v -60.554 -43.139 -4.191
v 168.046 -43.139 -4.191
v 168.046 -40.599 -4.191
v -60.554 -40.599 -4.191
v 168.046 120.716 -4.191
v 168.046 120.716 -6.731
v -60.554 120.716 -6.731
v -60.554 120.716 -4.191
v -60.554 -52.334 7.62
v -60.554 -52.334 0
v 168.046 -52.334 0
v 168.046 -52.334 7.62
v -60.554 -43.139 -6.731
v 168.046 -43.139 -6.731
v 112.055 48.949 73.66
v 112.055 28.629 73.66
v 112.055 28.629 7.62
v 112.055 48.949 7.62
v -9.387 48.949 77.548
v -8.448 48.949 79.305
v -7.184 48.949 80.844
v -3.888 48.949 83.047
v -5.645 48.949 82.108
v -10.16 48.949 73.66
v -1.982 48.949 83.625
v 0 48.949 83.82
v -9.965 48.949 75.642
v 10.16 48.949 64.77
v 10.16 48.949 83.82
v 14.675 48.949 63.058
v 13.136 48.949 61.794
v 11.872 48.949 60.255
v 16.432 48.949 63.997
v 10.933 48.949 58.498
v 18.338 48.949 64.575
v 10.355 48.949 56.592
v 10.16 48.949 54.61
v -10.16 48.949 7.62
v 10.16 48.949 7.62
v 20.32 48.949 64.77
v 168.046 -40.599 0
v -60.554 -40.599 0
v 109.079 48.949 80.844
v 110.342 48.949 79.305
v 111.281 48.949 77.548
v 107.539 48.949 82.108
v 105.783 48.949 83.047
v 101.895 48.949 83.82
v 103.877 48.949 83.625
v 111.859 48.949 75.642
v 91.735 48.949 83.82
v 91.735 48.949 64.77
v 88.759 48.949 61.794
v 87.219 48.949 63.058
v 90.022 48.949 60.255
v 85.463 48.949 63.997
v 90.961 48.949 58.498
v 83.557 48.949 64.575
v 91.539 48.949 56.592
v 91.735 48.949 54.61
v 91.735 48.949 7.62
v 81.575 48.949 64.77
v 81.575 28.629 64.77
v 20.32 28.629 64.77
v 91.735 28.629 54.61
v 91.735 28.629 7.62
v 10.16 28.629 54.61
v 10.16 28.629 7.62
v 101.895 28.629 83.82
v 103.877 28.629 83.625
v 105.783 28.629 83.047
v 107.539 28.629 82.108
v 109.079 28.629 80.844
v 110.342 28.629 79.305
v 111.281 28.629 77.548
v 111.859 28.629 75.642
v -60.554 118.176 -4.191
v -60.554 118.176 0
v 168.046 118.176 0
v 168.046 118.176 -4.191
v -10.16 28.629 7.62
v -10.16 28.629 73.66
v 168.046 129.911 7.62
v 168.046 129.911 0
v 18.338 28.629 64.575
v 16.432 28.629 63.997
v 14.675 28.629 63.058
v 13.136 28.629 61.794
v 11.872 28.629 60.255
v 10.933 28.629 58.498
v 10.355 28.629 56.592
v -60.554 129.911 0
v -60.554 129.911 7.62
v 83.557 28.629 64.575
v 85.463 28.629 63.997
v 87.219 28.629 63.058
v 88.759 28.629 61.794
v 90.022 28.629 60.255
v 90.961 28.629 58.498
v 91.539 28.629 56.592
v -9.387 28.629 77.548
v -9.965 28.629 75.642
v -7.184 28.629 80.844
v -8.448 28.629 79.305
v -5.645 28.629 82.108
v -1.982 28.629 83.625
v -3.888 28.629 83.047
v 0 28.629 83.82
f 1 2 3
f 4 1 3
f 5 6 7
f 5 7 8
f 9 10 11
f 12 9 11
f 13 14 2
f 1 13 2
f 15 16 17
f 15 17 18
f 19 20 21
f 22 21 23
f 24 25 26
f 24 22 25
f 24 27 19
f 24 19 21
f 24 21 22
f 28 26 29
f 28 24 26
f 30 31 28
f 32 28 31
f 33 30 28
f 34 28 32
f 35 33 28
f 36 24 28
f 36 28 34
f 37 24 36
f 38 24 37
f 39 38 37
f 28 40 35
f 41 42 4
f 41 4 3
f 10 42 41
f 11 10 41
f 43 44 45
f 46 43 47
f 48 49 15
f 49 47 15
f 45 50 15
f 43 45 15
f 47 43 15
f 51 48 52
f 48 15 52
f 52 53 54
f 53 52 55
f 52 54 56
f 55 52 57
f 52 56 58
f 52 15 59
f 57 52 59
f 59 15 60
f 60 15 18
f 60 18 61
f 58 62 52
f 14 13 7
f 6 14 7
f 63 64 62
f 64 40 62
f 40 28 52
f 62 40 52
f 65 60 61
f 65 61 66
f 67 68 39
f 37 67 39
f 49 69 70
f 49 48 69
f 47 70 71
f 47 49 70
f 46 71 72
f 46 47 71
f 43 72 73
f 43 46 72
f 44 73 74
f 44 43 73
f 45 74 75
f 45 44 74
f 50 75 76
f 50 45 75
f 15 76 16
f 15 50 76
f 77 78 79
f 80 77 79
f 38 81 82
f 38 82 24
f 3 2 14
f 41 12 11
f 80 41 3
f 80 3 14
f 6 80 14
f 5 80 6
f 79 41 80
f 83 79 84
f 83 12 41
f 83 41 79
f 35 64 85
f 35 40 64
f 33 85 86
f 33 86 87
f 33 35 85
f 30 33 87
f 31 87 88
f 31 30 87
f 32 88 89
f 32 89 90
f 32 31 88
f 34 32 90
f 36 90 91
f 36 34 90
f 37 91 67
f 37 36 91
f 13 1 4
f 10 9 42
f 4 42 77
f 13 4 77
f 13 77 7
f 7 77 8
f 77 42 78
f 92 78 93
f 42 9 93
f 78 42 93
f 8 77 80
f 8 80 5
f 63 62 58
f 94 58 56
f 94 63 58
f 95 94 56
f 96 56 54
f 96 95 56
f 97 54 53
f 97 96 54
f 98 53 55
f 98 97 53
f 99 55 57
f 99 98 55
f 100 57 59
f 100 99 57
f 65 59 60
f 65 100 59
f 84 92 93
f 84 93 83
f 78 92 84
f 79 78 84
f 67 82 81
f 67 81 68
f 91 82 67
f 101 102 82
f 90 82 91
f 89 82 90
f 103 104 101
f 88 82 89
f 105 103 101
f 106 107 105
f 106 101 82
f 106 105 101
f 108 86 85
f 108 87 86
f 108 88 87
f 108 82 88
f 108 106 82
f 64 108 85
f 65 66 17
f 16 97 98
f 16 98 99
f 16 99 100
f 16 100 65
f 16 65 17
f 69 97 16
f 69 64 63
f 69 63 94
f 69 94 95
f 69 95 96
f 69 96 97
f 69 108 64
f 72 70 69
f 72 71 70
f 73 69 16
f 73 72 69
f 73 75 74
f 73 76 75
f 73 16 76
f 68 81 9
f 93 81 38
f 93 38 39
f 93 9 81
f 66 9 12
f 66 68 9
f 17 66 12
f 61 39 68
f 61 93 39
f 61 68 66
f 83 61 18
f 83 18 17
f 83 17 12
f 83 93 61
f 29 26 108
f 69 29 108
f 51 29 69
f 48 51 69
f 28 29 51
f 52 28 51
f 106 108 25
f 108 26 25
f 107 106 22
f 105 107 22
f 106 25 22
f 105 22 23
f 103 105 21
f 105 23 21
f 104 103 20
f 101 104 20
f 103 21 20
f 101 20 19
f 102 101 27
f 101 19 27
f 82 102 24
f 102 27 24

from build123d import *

# Parameters (mm, degrees)
F0_W     = 228.6
F0_H     = 182.245
F1_DEPTH = 7.62
F2_W     = 228.6
F2_H     = 158.7754
F3_DEPTH = 6.731
F4_W     = 2.54
F4_H     = 2.54
F5_DEPTH = 228.6
F6_W     = 20.32
F6_H     = 20.32
F7_DEPTH = 76.2
F8_W     = 81.5747073555
F8_H     = 20.3200148768
F9_DEPTH = 19.05
F10_R    = 10.16


with BuildPart() as f1:
    # F0 (on Top) → F1 (new body)
    with BuildSketch(Plane.XY):
        with Locations((53.7457112223, 38.7887536495)):
            Rectangle(F0_W, F0_H)
    extrude(amount=F1_DEPTH)

    # F2 (on face) → F3 (join)
    with BuildSketch(Plane(origin=(0, 0, 0), x_dir=(1, 0, 0), z_dir=(0, 0, -1))):
        with Locations((53.7457112223, -38.7887536495)):
            Rectangle(F2_W, F2_H)
    extrude(amount=F3_DEPTH)

    # F4 (on face) → F5 (join)
    with BuildSketch(Plane.YZ.offset(168.0457112223)):
        with Locations((119.4464536495, -5.461)):
            Rectangle(F4_W, F4_H)
        with Locations((-41.8689463505, -5.461)):
            Rectangle(F4_W, F4_H)
    extrude(amount=-F5_DEPTH)

    # F6 (on face) → F7 (join)
    with BuildSketch(Plane.XY.offset(7.62)):
        with Locations((0, 38.7887536495)):
            Rectangle(F6_W, F6_H)
        Polygon((101.8946701026, 48.9487536495), (91.7346701026, 48.9487536495), (91.7346701026, 28.6287536495), (112.0546701026, 28.6287536495), (112.0546701026, 48.9487536495), align=None)
    extrude(amount=F7_DEPTH)

    # F8 (on face) → F9 (join)
    with BuildSketch(Plane.XY.offset(83.82)):
        with Locations((50.9473536777, 38.7887610879)):
            Rectangle(F8_W, F8_H)
    extrude(amount=-F9_DEPTH)

    # F10
    f10_edges = [f1.edges().sort_by_distance(p)[0] for p in [
        (-10.16, 38.788754, 83.82),
        (112.05467, 38.788754, 83.82),
        (10.16, 38.788754, 64.77),
        (91.73467, 38.788754, 64.77),
    ]]
    fillet(f10_edges, radius=F10_R)


solid = f1.part
